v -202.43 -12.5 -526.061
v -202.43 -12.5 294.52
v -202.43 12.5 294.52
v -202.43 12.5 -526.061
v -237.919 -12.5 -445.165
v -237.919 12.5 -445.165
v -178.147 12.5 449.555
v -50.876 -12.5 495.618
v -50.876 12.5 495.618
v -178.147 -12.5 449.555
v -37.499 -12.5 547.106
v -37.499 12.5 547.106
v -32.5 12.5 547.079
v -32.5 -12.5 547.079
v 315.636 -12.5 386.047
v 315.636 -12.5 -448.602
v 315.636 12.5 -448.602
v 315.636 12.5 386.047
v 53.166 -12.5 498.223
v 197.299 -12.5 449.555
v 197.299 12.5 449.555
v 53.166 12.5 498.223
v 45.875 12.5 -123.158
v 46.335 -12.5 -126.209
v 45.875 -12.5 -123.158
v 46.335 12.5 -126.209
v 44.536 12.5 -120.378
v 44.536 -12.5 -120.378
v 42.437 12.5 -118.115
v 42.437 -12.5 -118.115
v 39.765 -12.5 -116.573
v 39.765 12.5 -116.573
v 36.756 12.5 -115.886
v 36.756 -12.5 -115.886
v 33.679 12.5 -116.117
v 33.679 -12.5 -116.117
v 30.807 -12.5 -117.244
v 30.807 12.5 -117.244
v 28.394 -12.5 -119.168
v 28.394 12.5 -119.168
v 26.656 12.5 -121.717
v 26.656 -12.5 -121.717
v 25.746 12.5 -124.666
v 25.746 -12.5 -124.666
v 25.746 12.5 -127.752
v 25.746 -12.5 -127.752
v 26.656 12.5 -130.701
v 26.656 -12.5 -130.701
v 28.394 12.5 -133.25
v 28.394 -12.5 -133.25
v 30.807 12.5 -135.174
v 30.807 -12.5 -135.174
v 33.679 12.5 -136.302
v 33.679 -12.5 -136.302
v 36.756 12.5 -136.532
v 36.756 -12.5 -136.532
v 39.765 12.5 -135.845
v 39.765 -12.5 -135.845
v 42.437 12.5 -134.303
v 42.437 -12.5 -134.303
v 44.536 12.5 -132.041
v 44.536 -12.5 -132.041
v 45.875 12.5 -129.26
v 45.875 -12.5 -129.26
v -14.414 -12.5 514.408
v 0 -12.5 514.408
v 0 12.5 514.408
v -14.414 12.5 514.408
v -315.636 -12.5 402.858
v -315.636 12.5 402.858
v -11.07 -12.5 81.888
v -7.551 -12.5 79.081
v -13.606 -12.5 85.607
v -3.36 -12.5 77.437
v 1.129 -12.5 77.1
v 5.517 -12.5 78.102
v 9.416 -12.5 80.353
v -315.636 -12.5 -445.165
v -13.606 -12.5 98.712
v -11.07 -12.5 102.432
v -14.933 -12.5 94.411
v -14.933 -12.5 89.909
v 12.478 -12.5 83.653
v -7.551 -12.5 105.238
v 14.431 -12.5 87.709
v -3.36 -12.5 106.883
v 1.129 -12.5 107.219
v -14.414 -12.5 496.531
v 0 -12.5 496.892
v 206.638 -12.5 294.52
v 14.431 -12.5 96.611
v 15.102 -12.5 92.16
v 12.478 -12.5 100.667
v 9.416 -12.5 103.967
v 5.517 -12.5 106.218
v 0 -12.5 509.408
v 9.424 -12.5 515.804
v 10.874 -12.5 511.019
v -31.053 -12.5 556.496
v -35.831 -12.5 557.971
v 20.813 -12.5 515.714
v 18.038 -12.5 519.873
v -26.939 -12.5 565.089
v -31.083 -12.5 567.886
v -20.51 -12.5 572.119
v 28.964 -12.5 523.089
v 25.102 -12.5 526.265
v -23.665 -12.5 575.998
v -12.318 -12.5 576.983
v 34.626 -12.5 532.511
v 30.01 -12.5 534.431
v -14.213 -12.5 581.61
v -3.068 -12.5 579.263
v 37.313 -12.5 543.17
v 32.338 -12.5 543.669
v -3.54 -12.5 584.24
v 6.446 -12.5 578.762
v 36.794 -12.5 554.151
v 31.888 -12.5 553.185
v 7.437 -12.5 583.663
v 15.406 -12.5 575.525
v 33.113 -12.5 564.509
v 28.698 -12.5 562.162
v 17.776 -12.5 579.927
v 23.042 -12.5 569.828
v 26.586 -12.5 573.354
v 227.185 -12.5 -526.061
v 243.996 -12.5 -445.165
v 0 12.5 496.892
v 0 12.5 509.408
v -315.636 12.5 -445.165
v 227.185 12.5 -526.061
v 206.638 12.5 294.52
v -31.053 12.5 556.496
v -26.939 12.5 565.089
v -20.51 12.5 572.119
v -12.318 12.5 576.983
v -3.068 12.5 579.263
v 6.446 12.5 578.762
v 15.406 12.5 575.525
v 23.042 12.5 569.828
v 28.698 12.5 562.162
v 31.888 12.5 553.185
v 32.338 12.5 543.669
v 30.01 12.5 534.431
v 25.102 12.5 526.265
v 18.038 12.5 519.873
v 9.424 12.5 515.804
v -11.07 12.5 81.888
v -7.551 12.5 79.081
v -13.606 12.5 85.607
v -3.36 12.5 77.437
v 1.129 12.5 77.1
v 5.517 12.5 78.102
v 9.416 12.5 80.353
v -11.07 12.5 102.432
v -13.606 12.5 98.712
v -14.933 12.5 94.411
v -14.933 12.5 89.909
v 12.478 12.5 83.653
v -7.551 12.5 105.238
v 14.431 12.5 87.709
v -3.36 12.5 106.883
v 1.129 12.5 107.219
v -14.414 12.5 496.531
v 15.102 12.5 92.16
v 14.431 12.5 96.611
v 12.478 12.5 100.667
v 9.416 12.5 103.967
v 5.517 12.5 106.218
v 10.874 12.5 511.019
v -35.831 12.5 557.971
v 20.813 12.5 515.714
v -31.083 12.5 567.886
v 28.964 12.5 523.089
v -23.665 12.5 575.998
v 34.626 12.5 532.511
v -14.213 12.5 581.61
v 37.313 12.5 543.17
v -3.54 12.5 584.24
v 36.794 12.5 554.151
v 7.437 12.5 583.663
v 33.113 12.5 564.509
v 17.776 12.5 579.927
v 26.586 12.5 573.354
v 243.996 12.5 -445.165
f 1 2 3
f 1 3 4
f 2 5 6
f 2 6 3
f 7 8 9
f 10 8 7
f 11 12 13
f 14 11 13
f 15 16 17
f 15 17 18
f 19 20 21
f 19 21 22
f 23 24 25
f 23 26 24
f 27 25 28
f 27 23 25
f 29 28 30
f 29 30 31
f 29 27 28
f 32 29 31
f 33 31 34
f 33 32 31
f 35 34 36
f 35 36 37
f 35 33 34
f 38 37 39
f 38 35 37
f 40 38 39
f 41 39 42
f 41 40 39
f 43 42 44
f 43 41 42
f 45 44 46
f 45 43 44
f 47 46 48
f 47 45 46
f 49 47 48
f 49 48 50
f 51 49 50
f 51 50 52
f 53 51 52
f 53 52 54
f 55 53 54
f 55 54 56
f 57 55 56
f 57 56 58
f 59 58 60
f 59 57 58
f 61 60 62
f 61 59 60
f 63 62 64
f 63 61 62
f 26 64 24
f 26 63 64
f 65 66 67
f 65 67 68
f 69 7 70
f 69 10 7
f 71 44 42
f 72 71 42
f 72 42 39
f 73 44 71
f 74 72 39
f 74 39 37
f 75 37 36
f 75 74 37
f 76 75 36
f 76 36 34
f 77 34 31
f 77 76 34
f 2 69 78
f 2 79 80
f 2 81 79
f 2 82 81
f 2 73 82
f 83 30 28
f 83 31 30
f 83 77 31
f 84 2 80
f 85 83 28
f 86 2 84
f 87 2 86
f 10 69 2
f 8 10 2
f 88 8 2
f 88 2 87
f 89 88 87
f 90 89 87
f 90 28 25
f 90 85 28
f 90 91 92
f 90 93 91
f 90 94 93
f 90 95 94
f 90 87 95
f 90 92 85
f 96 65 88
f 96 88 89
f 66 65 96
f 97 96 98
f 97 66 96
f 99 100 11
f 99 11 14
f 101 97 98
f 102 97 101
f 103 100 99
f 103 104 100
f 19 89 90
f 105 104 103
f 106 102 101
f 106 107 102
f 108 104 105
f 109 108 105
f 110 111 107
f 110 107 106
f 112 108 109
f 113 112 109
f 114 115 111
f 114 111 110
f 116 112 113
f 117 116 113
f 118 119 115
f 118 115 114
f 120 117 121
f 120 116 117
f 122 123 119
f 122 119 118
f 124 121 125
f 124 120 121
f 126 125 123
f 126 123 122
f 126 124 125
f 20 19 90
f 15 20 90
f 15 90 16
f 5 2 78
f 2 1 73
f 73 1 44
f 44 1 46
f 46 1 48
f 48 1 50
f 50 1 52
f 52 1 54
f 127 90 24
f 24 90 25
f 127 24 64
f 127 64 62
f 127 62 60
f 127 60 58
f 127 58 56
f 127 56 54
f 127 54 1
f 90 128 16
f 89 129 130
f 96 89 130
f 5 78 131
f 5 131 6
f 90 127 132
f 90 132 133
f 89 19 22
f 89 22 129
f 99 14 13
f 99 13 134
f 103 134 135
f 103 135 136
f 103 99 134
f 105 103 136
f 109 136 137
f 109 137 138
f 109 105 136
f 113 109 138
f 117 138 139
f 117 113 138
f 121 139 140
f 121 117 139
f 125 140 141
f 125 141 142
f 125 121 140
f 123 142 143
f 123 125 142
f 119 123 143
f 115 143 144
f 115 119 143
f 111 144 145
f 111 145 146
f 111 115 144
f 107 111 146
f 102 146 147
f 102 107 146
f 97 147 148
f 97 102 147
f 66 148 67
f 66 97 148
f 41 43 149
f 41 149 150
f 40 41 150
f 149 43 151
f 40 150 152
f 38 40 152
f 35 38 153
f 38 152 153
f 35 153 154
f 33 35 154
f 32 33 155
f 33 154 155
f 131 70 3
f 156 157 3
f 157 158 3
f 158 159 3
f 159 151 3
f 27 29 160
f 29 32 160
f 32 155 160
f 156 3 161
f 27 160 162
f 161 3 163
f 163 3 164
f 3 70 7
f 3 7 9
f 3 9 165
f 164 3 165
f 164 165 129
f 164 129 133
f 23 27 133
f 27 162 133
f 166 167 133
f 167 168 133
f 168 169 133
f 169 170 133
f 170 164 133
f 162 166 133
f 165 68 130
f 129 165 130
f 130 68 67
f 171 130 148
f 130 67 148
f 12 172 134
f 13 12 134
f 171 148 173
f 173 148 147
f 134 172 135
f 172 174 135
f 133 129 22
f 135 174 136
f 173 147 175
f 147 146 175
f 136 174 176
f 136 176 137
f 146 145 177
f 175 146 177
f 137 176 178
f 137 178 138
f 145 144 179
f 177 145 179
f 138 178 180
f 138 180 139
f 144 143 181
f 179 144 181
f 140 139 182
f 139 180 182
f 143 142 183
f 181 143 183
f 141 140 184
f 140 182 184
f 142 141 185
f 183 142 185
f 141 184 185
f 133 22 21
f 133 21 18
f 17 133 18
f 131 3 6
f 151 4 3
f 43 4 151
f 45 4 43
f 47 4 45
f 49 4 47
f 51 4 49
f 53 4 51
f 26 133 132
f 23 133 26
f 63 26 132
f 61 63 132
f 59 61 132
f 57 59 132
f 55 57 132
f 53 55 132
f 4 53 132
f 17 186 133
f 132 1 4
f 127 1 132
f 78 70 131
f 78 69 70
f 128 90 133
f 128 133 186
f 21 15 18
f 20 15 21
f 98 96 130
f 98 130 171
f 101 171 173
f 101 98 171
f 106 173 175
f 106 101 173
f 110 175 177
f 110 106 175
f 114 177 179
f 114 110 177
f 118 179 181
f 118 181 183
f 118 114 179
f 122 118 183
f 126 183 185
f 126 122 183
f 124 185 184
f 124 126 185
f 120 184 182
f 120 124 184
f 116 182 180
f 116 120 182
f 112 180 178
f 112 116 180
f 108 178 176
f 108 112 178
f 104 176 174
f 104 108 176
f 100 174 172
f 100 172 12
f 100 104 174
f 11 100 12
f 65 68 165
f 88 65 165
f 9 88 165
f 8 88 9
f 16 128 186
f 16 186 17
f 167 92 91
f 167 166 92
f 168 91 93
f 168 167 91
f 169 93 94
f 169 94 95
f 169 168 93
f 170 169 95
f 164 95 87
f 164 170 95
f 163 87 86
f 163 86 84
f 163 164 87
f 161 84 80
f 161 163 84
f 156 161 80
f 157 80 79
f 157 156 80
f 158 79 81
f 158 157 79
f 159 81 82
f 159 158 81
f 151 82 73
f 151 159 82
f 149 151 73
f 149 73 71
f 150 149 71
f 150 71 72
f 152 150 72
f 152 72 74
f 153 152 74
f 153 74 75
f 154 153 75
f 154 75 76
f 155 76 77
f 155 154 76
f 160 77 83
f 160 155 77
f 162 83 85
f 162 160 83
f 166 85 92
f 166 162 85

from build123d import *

# Parameters (mm, degrees)
F0_R     = 10.3520416824
F0_R_2   = 15.1016918028
F1_DEPTH = 12.5


with BuildPart() as f1:
    # F0 (on Front) → F1 (new body, symmetric)
    with BuildSketch(Plane.XZ):
        Polygon((-315.6363590755, 402.8576135222), (-315.6363590755, -445.1646387913), (-237.9194677537, -445.1646387913), (-202.4295538493, 294.5199684009), (-202.4295538493, -526.0605984591), (227.1852354976, -526.0605984591), (206.6384547892, 294.5199684009), (243.9962564237, -445.1646387913), (315.6363590755, -448.601916045), (315.6363590755, 386.046592596), (197.2990004611, 449.5548381291), (53.1655277069, 498.2233074495), (0, 496.8920787035), (-14.4139876592, 496.531162231), (-50.8757645807, 495.6181840727), (-178.146982003, 449.5548381291), align=None)
        with Locations((35.982593894, -126.2090504169)):
            Circle(F0_R, mode=Mode.SUBTRACT)
        with Locations((0, 92.1598300338)):
            Circle(F0_R_2, mode=Mode.SUBTRACT)
        with BuildLine():
            Line((-14.4139876592, 514.4077504381), (-14.4139876592, 496.531162231))
            Line((-14.4139876592, 496.531162231), (0, 496.8920787035))
            Line((0, 496.8920787035), (0, 509.4077504381))
            ThreePointArc((0, 509.4077504381), (26.5864663022, 573.3541076459), (-37.4994765184, 547.1058939281))
            Line((-37.4994765184, 547.1058939281), (-32.499546316, 547.0794747961))
            ThreePointArc((-32.499546316, 547.0794747961), (23.0416041286, 569.8279266848), (0, 514.4077504381))
            Line((0, 514.4077504381), (-14.4139876592, 514.4077504381))
        make_face()
    extrude(amount=F1_DEPTH, both=True)


solid = f1.part
